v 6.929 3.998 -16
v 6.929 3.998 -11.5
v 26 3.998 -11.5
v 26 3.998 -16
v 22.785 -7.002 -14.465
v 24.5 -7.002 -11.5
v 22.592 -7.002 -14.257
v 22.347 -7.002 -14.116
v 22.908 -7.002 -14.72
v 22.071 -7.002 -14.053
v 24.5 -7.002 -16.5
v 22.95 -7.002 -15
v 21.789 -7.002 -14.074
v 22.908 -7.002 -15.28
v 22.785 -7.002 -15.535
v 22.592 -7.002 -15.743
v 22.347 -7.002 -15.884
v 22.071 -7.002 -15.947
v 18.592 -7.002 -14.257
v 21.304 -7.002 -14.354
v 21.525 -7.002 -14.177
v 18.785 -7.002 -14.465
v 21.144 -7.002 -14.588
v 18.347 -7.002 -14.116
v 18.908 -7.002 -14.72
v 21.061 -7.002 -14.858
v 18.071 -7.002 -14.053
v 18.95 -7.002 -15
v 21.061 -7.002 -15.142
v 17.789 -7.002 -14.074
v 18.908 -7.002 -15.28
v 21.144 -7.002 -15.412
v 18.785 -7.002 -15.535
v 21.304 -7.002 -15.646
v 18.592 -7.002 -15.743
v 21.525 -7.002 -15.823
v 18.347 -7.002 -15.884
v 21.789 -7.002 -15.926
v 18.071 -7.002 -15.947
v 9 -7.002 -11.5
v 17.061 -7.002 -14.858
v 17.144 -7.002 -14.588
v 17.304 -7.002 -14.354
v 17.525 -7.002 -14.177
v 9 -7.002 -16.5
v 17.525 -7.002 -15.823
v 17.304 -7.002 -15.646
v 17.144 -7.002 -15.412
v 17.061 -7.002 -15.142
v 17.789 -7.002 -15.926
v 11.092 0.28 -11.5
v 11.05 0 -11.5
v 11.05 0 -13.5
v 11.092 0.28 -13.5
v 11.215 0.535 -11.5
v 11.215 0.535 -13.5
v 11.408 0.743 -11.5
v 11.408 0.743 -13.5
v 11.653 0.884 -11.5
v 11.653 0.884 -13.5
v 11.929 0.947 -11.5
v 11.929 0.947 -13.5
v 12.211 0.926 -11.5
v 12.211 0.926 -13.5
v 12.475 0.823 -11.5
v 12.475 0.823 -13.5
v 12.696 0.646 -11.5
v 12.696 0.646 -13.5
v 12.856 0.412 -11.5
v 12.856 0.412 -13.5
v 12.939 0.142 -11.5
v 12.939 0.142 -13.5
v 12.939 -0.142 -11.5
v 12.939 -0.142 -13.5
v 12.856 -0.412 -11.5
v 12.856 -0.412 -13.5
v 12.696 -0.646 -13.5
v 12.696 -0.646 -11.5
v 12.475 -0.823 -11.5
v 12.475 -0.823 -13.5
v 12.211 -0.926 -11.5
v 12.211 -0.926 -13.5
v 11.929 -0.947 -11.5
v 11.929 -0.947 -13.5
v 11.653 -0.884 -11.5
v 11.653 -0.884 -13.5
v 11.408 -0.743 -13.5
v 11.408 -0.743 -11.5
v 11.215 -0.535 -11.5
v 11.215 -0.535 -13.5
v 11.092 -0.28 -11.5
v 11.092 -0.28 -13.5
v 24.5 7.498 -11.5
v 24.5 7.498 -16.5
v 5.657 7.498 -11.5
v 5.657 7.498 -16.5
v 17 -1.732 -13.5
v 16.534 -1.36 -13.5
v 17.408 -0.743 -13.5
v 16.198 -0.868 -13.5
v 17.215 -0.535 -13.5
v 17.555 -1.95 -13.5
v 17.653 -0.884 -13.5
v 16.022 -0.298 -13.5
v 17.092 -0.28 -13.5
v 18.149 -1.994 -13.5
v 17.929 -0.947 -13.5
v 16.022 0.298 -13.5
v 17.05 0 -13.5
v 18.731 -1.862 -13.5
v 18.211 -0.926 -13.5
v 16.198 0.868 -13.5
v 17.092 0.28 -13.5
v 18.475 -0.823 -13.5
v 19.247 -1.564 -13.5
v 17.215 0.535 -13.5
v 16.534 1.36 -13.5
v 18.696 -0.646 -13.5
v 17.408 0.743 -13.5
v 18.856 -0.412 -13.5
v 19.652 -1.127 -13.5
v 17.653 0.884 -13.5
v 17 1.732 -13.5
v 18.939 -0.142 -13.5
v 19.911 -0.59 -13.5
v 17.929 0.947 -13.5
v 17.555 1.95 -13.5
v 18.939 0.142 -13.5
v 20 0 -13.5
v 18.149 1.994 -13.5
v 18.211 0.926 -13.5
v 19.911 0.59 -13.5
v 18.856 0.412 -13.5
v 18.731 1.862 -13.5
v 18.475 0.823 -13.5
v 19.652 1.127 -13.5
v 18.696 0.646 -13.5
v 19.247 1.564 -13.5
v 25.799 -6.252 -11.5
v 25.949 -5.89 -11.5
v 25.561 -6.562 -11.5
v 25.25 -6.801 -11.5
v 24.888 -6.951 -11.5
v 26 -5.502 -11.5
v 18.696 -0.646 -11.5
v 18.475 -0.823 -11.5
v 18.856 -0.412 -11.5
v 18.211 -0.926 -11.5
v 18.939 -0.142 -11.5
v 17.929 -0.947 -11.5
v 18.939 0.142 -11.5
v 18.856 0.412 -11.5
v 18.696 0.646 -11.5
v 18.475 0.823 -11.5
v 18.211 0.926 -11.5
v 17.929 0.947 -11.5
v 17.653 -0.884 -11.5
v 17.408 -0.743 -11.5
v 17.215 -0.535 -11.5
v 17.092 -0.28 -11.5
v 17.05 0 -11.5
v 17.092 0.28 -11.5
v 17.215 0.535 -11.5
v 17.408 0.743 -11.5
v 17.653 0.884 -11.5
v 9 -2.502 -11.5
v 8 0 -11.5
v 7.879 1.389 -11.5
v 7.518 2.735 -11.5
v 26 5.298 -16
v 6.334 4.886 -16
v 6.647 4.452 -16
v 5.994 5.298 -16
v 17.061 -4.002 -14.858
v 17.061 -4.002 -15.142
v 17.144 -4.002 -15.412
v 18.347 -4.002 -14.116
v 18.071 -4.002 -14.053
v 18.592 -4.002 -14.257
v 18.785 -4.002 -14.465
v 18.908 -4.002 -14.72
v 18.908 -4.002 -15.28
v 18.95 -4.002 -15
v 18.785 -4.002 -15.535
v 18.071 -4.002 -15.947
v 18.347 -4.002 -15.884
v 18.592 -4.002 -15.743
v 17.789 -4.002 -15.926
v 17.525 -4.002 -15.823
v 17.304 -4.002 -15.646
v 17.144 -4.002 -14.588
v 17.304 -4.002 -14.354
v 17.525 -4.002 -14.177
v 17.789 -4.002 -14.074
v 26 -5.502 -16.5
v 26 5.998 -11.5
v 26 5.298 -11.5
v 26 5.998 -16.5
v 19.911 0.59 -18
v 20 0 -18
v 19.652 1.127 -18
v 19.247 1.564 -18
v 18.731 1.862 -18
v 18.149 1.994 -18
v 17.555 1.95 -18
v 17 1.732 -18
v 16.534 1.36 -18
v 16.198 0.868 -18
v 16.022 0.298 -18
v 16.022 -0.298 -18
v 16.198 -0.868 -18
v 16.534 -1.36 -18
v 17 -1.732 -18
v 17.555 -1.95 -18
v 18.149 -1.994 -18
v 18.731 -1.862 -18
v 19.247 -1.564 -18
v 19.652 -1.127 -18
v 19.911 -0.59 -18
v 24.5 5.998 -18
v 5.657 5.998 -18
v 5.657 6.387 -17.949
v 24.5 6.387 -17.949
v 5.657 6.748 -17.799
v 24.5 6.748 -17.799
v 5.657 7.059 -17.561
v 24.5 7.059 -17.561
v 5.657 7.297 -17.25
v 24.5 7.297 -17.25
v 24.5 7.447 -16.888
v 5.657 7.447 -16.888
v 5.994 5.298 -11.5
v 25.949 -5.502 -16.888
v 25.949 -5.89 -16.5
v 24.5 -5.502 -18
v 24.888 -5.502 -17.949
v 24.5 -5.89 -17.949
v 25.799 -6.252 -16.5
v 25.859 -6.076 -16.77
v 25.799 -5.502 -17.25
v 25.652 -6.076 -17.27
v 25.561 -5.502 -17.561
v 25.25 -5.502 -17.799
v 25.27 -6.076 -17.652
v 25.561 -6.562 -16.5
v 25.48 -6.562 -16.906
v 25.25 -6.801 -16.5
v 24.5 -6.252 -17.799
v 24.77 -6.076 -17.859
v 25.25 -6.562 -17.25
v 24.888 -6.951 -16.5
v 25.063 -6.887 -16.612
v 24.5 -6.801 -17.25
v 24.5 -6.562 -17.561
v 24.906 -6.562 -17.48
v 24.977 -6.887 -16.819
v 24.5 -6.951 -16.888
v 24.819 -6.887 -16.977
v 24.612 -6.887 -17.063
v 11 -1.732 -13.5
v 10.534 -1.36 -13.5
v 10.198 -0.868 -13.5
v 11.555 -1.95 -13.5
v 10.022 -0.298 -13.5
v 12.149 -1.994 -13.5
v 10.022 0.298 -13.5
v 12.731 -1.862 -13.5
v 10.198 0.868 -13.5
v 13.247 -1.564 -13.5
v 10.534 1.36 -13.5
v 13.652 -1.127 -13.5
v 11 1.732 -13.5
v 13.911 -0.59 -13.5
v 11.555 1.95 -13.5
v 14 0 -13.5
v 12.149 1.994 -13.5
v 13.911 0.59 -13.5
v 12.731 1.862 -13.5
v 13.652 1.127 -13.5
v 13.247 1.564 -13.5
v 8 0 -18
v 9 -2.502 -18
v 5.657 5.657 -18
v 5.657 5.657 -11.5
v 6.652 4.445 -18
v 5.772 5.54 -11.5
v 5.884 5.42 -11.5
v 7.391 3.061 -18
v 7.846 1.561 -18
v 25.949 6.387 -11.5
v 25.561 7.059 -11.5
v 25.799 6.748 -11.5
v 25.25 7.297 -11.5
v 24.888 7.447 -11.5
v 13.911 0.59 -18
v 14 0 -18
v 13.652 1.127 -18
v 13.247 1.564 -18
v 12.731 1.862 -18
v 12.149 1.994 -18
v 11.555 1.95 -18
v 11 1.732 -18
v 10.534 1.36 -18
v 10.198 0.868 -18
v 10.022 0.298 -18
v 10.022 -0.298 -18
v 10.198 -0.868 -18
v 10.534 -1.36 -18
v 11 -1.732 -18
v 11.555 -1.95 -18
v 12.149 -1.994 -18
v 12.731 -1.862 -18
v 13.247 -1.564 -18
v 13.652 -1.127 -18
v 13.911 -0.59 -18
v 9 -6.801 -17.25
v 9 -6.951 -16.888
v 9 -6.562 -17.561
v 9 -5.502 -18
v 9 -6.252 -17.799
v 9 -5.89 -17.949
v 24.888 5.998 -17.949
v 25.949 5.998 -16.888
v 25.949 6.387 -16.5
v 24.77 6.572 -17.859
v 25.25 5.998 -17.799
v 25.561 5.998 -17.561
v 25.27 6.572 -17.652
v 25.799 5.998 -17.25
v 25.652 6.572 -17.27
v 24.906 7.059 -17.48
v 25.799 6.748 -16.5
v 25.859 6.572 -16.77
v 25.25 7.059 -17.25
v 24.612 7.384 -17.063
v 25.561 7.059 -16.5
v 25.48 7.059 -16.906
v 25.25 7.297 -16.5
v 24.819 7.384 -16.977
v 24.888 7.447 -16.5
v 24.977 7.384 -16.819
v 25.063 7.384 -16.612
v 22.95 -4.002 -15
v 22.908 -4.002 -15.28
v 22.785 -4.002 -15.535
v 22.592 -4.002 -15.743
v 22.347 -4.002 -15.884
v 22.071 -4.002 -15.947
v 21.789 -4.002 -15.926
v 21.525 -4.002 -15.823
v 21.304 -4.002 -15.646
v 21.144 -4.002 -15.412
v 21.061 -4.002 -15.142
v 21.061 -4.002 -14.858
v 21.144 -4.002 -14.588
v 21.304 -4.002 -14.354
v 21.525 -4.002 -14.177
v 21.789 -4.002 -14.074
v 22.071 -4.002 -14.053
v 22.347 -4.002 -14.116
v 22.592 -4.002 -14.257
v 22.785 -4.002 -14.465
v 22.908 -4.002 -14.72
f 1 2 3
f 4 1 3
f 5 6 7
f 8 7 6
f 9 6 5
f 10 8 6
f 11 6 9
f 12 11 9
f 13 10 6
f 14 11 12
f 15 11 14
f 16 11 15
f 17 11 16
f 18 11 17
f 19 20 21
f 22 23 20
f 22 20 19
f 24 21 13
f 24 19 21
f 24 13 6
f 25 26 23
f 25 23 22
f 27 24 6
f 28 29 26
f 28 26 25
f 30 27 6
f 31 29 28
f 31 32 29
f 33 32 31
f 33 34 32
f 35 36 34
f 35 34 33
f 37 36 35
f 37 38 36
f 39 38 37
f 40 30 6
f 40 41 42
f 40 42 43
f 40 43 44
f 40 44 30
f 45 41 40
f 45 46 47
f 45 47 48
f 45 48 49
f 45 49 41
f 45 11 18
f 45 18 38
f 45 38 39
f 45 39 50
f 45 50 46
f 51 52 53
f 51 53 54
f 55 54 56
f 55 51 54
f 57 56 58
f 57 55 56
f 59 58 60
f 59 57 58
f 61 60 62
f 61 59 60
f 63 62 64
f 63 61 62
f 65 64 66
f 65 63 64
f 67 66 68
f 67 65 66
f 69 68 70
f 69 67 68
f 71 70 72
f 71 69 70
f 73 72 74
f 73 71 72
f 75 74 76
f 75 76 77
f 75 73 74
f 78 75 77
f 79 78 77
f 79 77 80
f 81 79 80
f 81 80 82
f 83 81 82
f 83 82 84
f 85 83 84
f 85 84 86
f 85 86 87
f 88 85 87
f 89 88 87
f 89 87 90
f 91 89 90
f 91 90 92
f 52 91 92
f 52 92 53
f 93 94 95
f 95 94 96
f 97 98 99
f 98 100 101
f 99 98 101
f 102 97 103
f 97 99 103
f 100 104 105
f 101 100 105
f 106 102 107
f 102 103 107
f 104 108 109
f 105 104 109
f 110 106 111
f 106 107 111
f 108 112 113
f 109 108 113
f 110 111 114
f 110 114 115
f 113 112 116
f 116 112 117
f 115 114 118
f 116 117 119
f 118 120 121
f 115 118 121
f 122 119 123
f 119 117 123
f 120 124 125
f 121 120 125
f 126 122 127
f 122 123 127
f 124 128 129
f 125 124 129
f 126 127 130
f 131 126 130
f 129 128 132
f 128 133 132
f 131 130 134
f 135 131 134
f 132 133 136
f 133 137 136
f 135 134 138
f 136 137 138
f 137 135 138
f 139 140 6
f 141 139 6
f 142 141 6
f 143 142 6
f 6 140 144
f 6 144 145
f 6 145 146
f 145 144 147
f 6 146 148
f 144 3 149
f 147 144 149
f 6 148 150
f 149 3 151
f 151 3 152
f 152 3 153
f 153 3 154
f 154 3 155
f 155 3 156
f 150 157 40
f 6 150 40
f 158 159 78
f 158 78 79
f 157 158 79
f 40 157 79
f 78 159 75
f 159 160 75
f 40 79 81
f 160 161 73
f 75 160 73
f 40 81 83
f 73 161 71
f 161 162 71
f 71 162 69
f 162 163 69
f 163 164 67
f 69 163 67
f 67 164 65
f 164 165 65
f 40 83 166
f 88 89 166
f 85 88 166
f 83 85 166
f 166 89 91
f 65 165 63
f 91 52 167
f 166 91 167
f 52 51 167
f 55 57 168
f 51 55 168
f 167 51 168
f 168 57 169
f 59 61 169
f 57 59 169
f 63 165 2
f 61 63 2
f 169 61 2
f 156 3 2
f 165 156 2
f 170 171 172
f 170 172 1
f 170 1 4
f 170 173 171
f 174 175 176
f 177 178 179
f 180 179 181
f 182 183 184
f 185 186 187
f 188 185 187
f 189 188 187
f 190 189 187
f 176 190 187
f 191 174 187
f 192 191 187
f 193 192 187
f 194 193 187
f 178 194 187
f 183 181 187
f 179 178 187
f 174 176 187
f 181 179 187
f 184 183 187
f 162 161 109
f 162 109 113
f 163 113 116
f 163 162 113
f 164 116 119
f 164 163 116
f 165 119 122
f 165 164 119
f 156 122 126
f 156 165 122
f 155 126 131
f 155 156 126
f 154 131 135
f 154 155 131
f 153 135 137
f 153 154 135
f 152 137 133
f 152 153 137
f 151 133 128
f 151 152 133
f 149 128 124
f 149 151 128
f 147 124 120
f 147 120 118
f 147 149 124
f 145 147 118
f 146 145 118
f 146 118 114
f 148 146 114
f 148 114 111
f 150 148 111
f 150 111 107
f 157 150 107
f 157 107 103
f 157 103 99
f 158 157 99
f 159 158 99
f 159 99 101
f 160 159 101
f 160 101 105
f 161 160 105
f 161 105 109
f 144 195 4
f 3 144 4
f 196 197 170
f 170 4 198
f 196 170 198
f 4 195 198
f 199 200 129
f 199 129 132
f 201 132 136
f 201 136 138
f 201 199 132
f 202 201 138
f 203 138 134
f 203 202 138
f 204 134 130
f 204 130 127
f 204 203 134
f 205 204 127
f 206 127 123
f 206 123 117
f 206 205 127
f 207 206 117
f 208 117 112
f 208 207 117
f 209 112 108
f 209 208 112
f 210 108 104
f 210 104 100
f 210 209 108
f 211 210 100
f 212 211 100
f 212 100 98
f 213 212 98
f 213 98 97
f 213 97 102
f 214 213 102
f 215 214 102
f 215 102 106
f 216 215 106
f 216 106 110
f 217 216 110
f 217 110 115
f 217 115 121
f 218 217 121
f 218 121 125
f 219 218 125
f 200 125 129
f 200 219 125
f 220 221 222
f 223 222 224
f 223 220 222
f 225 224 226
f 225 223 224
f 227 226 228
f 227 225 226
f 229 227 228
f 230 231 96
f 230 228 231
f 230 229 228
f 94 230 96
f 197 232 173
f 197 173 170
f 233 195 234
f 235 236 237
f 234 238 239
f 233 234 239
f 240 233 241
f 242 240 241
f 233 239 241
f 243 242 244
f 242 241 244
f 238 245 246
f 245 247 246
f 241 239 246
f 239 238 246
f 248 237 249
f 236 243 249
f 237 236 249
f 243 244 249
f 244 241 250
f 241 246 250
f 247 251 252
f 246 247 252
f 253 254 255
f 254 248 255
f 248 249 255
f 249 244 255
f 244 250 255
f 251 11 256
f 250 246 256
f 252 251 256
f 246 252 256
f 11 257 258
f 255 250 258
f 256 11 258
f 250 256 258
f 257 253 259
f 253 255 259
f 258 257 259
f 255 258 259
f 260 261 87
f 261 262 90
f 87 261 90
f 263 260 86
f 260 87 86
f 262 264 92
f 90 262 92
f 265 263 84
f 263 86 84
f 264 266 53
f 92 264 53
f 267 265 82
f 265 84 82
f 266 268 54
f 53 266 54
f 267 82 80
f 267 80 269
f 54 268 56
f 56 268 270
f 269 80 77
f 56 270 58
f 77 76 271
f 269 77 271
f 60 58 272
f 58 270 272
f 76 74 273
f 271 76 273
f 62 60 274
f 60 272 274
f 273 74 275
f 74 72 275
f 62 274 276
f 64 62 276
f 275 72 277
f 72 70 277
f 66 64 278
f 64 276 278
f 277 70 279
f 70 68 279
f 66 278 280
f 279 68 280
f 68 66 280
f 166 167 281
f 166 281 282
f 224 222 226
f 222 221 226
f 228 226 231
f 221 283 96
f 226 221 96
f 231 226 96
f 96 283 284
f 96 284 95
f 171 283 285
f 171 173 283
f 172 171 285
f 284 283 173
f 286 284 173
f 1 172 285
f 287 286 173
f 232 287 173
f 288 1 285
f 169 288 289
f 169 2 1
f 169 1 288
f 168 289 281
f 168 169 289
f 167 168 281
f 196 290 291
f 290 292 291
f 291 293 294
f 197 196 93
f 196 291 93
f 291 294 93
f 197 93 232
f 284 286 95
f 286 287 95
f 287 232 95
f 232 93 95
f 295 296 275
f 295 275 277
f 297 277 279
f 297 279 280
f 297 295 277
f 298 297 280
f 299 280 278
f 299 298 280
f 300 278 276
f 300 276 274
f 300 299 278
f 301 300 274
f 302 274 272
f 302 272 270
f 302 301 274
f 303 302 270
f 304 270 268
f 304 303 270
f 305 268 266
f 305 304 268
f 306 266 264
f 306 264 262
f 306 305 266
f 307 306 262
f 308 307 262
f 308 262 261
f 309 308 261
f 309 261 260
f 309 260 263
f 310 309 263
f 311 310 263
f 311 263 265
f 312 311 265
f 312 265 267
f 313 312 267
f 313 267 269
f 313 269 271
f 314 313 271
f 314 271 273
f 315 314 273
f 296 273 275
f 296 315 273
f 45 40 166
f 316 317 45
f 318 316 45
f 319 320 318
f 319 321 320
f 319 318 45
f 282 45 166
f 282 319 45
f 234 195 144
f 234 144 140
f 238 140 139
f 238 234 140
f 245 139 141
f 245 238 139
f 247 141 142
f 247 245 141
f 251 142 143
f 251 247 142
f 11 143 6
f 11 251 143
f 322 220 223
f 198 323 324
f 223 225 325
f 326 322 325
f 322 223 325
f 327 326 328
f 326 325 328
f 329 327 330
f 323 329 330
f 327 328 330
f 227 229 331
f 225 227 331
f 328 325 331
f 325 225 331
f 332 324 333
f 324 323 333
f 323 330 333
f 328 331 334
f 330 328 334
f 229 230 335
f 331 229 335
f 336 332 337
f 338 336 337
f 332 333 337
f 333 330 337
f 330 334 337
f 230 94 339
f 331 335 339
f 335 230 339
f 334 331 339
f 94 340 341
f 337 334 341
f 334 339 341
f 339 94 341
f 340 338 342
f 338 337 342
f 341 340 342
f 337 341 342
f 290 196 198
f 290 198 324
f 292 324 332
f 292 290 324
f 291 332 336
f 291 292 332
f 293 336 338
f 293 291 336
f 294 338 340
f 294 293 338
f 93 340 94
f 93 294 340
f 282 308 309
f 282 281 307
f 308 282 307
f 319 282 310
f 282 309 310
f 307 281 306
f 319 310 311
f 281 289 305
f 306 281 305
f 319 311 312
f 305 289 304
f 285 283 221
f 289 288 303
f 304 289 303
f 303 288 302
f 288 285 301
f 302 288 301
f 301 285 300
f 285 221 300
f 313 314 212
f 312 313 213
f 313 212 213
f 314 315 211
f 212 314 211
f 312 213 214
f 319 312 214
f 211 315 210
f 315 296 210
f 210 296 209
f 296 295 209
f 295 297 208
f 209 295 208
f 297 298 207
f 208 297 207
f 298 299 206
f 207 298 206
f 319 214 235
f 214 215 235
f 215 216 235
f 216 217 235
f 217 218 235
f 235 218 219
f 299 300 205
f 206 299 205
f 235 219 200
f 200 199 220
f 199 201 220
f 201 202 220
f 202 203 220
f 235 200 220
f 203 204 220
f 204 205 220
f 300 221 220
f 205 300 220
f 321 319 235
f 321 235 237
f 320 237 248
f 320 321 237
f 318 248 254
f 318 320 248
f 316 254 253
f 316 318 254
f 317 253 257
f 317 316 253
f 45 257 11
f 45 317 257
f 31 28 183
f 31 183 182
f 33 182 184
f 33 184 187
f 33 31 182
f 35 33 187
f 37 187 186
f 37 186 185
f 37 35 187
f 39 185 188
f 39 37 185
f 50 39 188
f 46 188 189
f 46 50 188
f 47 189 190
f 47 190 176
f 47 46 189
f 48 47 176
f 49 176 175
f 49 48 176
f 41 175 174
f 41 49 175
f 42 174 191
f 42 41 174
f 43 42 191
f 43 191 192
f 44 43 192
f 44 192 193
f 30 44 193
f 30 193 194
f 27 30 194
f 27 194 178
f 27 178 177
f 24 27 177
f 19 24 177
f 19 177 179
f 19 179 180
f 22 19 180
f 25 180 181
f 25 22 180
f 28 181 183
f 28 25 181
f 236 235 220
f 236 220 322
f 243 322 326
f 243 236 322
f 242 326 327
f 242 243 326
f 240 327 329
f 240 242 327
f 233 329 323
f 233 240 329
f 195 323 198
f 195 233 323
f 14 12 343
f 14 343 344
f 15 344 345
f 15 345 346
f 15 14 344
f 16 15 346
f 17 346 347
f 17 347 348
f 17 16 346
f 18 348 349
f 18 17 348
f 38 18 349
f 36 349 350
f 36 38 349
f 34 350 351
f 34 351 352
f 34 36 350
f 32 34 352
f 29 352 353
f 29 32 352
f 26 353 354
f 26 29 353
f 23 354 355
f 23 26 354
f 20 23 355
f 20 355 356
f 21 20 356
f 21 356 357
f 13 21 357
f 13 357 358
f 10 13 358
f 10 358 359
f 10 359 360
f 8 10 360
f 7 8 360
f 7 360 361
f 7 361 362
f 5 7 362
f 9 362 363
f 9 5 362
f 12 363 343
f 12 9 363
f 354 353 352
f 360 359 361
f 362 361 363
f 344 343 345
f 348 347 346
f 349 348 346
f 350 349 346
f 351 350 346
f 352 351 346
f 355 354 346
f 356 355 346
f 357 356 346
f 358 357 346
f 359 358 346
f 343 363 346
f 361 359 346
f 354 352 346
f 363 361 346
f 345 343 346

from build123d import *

# Parameters (mm, degrees)
BOSS_EXTRUDE1_DEPTH = 2
BOSS_EXTRUDE2_START = 4.5
BOSS_EXTRUDE2_DEPTH = 4.5
CUT_EXTRUDE1_DEPTH  = 4.5
BOSS_EXTRUDE3_DEPTH = 2.3
SKETCH9_R           = 2.1
CUT_EXTRUDE2_DEPTH  = 2.5
SKETCH10_R          = 2.5
BOSS_EXTRUDE4_DEPTH = 1.2
SKETCH11_R          = 0.95
CUT_EXTRUDE3_DEPTH  = 9.2
SKETCH12_R          = 2
CUT_EXTRUDE4_DEPTH  = 4.5
SKETCH14_W          = 20.343145751
SKETCH14_H          = 1.841510486
SKETCH14_W_2        = 17
SKETCH14_H_2        = 1.341637015
BOSS_EXTRUDE5_DEPTH = 1.2
FILLET1_R           = 1.5
SKETCH17_R          = 0.95
CUT_EXTRUDE5_DEPTH  = 3


# Read off the part's stored shape, not the designer's step: Boss-Extrude3
with BuildPart() as part:
    # Sketch5 → Boss-Extrude1 (new body)
    with BuildSketch(Plane.XY):
        with BuildLine():
            Line((8, 0), (9, -2.501635265))
            Line((9, -2.501635265), (9, -7.001635265))
            Line((9, -7.001635265), (26, -7.001635265))
            Line((26, -7.001635265), (26, 7.498364735))
            Line((26, 7.498364735), (5.656854249, 7.498364735))
            Line((5.656854249, 7.498364735), (5.656854249, 5.656854249))
            ThreePointArc((5.656854249, 5.656854249), (7.39103626, 3.061467459), (8, 0))
        make_face()
    extrude(amount=BOSS_EXTRUDE1_DEPTH)

    # Sketch6 → Boss-Extrude2 (add)
    with BuildSketch(Plane(origin=(0, 0, 0), x_dir=(-1, 0, 0), z_dir=(0, 0, -1)).offset(BOSS_EXTRUDE2_START)):
        with BuildLine():
            Line((-5.656854249, 7.498364735), (-5.656854249, 5.656854249))
            ThreePointArc((-5.656854249, 5.656854249), (-7.39103626, 3.061467459), (-8, 0))
            Line((-8, 0), (-9, -2.501635265))
            Line((-9, -2.501635265), (-9, -7.001635265))
            Line((-9, -7.001635265), (-26, -7.001635265))
            Line((-26, -7.001635265), (-26, 7.498364735))
            Line((-26, 7.498364735), (-5.656854249, 7.498364735))
        make_face()
    extrude(amount=-BOSS_EXTRUDE2_DEPTH)

    # Sketch7 → Cut-Extrude1 (cut)
    with BuildSketch(Plane(origin=(0, 0, -4.5), x_dir=(-1, 0, 0), z_dir=(0, 0, -1))):
        Polygon((-26, 5.298364735), (-2.738141148, 5.298364735), (-2.738141148, 3.998364735), (-29.849535112, 3.998364735), (-29.849535112, 5.298364735), align=None)
    extrude(amount=-CUT_EXTRUDE1_DEPTH, mode=Mode.SUBTRACT)

    # Boss-Extrude3 outline → Boss-Extrude3 (add)
    with BuildSketch(Plane(origin=(0, 0, -4.5), x_dir=(-1, 0, 0), z_dir=(0, 0, -1))):
        with BuildLine():
            Line((-9, -7.001635265), (-9, -5.65999825))
            Line((-9, -5.65999825), (0, -5.659997813))
            ThreePointArc((0, -5.659997813), (5.659997813, 0), (0, 5.659997813))
            Line((0, 5.659997813), (-5.656854249, 5.656854249))
            Line((-5.656854249, 5.656854249), (-5.656854249, 7.498364735))
            Line((-5.656854249, 7.498364735), (-26, 7.498364735))
            Line((-26, 7.498364735), (-26, -7.001635265))
            Line((-26, -7.001635265), (-9, -7.001635265))
        make_face()
    extrude(amount=BOSS_EXTRUDE3_DEPTH)

    # Sketch9 → Cut-Extrude2 (cut)
    with BuildSketch(Plane(origin=(0, 0, -6.8), x_dir=(-1, 0, 0), z_dir=(0, 0, -1))):
        Circle(SKETCH9_R)
    extrude(amount=-CUT_EXTRUDE2_DEPTH, mode=Mode.SUBTRACT)

    # Sketch10 → Boss-Extrude4 (add)
    with BuildSketch(Plane(origin=(0, 0, -6.8), x_dir=(-1, 0, 0), z_dir=(0, 0, -1))):
        with Locations((-12, 0)):
            Circle(SKETCH10_R)
        with Locations((-18, 0)):
            Circle(SKETCH10_R)
    extrude(amount=BOSS_EXTRUDE4_DEPTH)

    # Sketch11 → Cut-Extrude3 (cut)
    with BuildSketch(Plane(origin=(0, 0, -8), x_dir=(-1, 0, 0), z_dir=(0, 0, -1))):
        with Locations((-18, 0)):
            Circle(SKETCH11_R)
        with Locations((-12, 0)):
            Circle(SKETCH11_R)
    extrude(amount=-CUT_EXTRUDE3_DEPTH, mode=Mode.SUBTRACT)

    # Sketch12 → Cut-Extrude4 (cut)
    with BuildSketch(Plane.XY.offset(2)):
        with Locations((12, 0)):
            Circle(SKETCH12_R)
        with Locations((18, 0)):
            Circle(SKETCH12_R)
    extrude(amount=-CUT_EXTRUDE4_DEPTH, mode=Mode.SUBTRACT)

    # Sketch14 → Boss-Extrude5 (add)
    with BuildSketch(Plane(origin=(0, 0, -6.8), x_dir=(-1, 0, 0), z_dir=(0, 0, -1))):
        with Locations((-15.828427124, 6.577609492)):
            Rectangle(SKETCH14_W, SKETCH14_H)
        with Locations((-17.5, -6.330816758)):
            Rectangle(SKETCH14_W_2, SKETCH14_H_2)
    extrude(amount=BOSS_EXTRUDE5_DEPTH)

    # Fillet1
    # the kernel refuses this fillet: 1.5 mm, written as the material it takes off along each edge
    with BuildSketch(Plane(origin=(24.5, -5.501635265, 0.5), x_dir=(0, 0, 1), z_dir=(0, -1, 0))) as fillet1_piece_1_section:
        Polygon((0, 0), (FILLET1_R, 0), (FILLET1_R, -FILLET1_R), (0, -FILLET1_R), align=None)
    fillet1_piece_1 = extrude(amount=FILLET1_R, mode=Mode.PRIVATE)
    fillet1_piece_1 = fillet1_piece_1 - Plane(origin=(24.5, -5.501635265, 0.5), x_dir=(-0.7071067811865475, 0, -0.7071067811865475), z_dir=(0, -1, 0)) * Sphere(FILLET1_R, mode=Mode.PRIVATE)
    add(fillet1_piece_1, mode=Mode.SUBTRACT)
    with BuildSketch(Plane(origin=(24.5, 5.998364735, 0.5), x_dir=(0, 0, 1), z_dir=(0, 1, 0))) as fillet1_piece_2_section:
        Polygon((0, 0), (FILLET1_R, 0), (FILLET1_R, FILLET1_R), (0, FILLET1_R), align=None)
    fillet1_piece_2 = extrude(amount=FILLET1_R, mode=Mode.PRIVATE)
    fillet1_piece_2 = fillet1_piece_2 - Plane(origin=(24.5, 5.998364735, 0.5), x_dir=(-0.7071067811865475, 0, -0.7071067811865475), z_dir=(0, 1, 0)) * Sphere(FILLET1_R, mode=Mode.PRIVATE)
    add(fillet1_piece_2, mode=Mode.SUBTRACT)
    with BuildSketch(Plane(origin=(26, -5.501635265, 2), x_dir=(-1, 0, 0), z_dir=(0, 1, 0))) as fillet1_piece_3:
        with BuildLine():
            CenterArc((FILLET1_R, -FILLET1_R), FILLET1_R, 90, 90)
            Line((0, -FILLET1_R), (0, 0))
            Line((0, 0), (FILLET1_R, 0))
        make_face()
    extrude(amount=11.5, mode=Mode.SUBTRACT)
    with BuildSketch(Plane(origin=(26, -7.001635265, -4.5), x_dir=(-1, 0, 0), z_dir=(0, 0, 1))) as fillet1_piece_4:
        with BuildLine():
            CenterArc((FILLET1_R, -FILLET1_R), FILLET1_R, 90, 90)
            Line((0, -FILLET1_R), (0, 0))
            Line((0, 0), (FILLET1_R, 0))
        make_face()
    extrude(amount=5, mode=Mode.SUBTRACT)
    with BuildSketch(Plane(origin=(5.25, -7.001635265, 2), x_dir=(0, 1, 0), z_dir=(1, 0, 0))) as fillet1_piece_5:
        with BuildLine():
            CenterArc((FILLET1_R, -FILLET1_R), FILLET1_R, 90, 90)
            Line((0, -FILLET1_R), (0, 0))
            Line((0, 0), (FILLET1_R, 0))
        make_face()
    extrude(amount=19.25, mode=Mode.SUBTRACT)
    with BuildSketch(Plane(origin=(24.5, 7.498364735, 2), x_dir=(0, -1, 0), z_dir=(-1, 0, 0))) as fillet1_piece_6:
        with BuildLine():
            CenterArc((FILLET1_R, -FILLET1_R), FILLET1_R, 90, 90)
            Line((0, -FILLET1_R), (0, 0))
            Line((0, 0), (FILLET1_R, 0))
        make_face()
    extrude(amount=22.593145751, mode=Mode.SUBTRACT)
    with BuildSketch(Plane(origin=(26, 7.498364735, -4.5), x_dir=(-1, 0, 0), z_dir=(0, 0, 1))) as fillet1_piece_7:
        with BuildLine():
            CenterArc((FILLET1_R, FILLET1_R), FILLET1_R, 180, 90)
            Line((0, FILLET1_R), (0, 0))
            Line((0, 0), (FILLET1_R, 0))
        make_face()
    extrude(amount=5, mode=Mode.SUBTRACT)
    with BuildSketch(Plane(origin=(26, 7.498364735, -4.5), x_dir=(-1.0, -1.9174232572065026e-10, 0), z_dir=(0, 0, -1))) as fillet1_piece_8:
        with BuildLine():
            CenterArc((FILLET1_R, -FILLET1_R), FILLET1_R, 90.000000011, 90)
            Line((FILLET1_R * 1.9173522033e-10, -FILLET1_R), (0, 0))
            Line((0, 0), (FILLET1_R, 0))
        make_face()
    extrude(amount=2.3, mode=Mode.SUBTRACT)
    with BuildSketch(Plane(origin=(26, 7.498364735, -6.8), x_dir=(-1, 0, 0), z_dir=(0, 0, -1))) as fillet1_piece_9:
        with BuildLine():
            CenterArc((FILLET1_R, -FILLET1_R), FILLET1_R, 90, 90)
            Line((0, -FILLET1_R), (0, 0))
            Line((0, 0), (FILLET1_R, 0))
        make_face()
    extrude(amount=4.95, mode=Mode.SUBTRACT)
    with BuildSketch(Plane(origin=(26, -7.001635265, -4.5), x_dir=(-1.0, -1.9169850891861218e-10, 0), z_dir=(0, 0, -1))) as fillet1_piece_10:
        with BuildLine():
            CenterArc((FILLET1_R, FILLET1_R), FILLET1_R, 180.000000011, 90)
            Line((-FILLET1_R * 1.91707982785e-10, FILLET1_R), (0, 0))
            Line((0, 0), (FILLET1_R, 0))
        make_face()
    extrude(amount=2.3, mode=Mode.SUBTRACT)
    with BuildSketch(Plane(origin=(26, -7.001635265, -6.8), x_dir=(-1, 0, 0), z_dir=(0, 0, -1))) as fillet1_piece_11:
        with BuildLine():
            CenterArc((FILLET1_R, FILLET1_R), FILLET1_R, 180, 90)
            Line((0, FILLET1_R), (0, 0))
            Line((0, 0), (FILLET1_R, 0))
        make_face()
    extrude(amount=4.95, mode=Mode.SUBTRACT)

    # Sketch17 → Cut-Extrude5 (cut)
    with BuildSketch(Plane.XZ.offset(7.001635265)):
        with Locations((22, -1)):
            Circle(SKETCH17_R)
        with Locations((18, -1)):
            Circle(SKETCH17_R)
    extrude(amount=-CUT_EXTRUDE5_DEPTH, mode=Mode.SUBTRACT)

    # Mirror1: part across plane


with BuildPart() as part_1:
    add(part.part)
    add(part.part.mirror(Plane(origin=(0, 0, -8), x_dir=(1, 0, 0), z_dir=(0, 0, -1))))


with BuildPart() as body_2:
    # Split1: the piece on the far side of the plane
    add(part_1.part)
    split(bisect_by=Plane(origin=(0, 0, -8), x_dir=(-1, 0, 0), z_dir=(0, 0, -1)), keep=Keep.BOTTOM)


with BuildPart() as part_2:
    add(part_1.part)

    # Split1
    split(bisect_by=Plane(origin=(0, 0, -8), x_dir=(-1, 0, 0), z_dir=(0, 0, -1)), keep=Keep.TOP)


with BuildPart() as body_2_2:
    # Split2: the piece on the far side of the plane
    add(part_2.part)
    split(bisect_by=Plane(origin=(0, 0, -11.5), x_dir=(-1, 0, 0), z_dir=(0, 0, -1)), keep=Keep.BOTTOM)


with BuildPart() as part_3:
    add(part_2.part)

    # Split2
    split(bisect_by=Plane(origin=(0, 0, -11.5), x_dir=(-1, 0, 0), z_dir=(0, 0, -1)), keep=Keep.TOP)


solid = part_3.part
